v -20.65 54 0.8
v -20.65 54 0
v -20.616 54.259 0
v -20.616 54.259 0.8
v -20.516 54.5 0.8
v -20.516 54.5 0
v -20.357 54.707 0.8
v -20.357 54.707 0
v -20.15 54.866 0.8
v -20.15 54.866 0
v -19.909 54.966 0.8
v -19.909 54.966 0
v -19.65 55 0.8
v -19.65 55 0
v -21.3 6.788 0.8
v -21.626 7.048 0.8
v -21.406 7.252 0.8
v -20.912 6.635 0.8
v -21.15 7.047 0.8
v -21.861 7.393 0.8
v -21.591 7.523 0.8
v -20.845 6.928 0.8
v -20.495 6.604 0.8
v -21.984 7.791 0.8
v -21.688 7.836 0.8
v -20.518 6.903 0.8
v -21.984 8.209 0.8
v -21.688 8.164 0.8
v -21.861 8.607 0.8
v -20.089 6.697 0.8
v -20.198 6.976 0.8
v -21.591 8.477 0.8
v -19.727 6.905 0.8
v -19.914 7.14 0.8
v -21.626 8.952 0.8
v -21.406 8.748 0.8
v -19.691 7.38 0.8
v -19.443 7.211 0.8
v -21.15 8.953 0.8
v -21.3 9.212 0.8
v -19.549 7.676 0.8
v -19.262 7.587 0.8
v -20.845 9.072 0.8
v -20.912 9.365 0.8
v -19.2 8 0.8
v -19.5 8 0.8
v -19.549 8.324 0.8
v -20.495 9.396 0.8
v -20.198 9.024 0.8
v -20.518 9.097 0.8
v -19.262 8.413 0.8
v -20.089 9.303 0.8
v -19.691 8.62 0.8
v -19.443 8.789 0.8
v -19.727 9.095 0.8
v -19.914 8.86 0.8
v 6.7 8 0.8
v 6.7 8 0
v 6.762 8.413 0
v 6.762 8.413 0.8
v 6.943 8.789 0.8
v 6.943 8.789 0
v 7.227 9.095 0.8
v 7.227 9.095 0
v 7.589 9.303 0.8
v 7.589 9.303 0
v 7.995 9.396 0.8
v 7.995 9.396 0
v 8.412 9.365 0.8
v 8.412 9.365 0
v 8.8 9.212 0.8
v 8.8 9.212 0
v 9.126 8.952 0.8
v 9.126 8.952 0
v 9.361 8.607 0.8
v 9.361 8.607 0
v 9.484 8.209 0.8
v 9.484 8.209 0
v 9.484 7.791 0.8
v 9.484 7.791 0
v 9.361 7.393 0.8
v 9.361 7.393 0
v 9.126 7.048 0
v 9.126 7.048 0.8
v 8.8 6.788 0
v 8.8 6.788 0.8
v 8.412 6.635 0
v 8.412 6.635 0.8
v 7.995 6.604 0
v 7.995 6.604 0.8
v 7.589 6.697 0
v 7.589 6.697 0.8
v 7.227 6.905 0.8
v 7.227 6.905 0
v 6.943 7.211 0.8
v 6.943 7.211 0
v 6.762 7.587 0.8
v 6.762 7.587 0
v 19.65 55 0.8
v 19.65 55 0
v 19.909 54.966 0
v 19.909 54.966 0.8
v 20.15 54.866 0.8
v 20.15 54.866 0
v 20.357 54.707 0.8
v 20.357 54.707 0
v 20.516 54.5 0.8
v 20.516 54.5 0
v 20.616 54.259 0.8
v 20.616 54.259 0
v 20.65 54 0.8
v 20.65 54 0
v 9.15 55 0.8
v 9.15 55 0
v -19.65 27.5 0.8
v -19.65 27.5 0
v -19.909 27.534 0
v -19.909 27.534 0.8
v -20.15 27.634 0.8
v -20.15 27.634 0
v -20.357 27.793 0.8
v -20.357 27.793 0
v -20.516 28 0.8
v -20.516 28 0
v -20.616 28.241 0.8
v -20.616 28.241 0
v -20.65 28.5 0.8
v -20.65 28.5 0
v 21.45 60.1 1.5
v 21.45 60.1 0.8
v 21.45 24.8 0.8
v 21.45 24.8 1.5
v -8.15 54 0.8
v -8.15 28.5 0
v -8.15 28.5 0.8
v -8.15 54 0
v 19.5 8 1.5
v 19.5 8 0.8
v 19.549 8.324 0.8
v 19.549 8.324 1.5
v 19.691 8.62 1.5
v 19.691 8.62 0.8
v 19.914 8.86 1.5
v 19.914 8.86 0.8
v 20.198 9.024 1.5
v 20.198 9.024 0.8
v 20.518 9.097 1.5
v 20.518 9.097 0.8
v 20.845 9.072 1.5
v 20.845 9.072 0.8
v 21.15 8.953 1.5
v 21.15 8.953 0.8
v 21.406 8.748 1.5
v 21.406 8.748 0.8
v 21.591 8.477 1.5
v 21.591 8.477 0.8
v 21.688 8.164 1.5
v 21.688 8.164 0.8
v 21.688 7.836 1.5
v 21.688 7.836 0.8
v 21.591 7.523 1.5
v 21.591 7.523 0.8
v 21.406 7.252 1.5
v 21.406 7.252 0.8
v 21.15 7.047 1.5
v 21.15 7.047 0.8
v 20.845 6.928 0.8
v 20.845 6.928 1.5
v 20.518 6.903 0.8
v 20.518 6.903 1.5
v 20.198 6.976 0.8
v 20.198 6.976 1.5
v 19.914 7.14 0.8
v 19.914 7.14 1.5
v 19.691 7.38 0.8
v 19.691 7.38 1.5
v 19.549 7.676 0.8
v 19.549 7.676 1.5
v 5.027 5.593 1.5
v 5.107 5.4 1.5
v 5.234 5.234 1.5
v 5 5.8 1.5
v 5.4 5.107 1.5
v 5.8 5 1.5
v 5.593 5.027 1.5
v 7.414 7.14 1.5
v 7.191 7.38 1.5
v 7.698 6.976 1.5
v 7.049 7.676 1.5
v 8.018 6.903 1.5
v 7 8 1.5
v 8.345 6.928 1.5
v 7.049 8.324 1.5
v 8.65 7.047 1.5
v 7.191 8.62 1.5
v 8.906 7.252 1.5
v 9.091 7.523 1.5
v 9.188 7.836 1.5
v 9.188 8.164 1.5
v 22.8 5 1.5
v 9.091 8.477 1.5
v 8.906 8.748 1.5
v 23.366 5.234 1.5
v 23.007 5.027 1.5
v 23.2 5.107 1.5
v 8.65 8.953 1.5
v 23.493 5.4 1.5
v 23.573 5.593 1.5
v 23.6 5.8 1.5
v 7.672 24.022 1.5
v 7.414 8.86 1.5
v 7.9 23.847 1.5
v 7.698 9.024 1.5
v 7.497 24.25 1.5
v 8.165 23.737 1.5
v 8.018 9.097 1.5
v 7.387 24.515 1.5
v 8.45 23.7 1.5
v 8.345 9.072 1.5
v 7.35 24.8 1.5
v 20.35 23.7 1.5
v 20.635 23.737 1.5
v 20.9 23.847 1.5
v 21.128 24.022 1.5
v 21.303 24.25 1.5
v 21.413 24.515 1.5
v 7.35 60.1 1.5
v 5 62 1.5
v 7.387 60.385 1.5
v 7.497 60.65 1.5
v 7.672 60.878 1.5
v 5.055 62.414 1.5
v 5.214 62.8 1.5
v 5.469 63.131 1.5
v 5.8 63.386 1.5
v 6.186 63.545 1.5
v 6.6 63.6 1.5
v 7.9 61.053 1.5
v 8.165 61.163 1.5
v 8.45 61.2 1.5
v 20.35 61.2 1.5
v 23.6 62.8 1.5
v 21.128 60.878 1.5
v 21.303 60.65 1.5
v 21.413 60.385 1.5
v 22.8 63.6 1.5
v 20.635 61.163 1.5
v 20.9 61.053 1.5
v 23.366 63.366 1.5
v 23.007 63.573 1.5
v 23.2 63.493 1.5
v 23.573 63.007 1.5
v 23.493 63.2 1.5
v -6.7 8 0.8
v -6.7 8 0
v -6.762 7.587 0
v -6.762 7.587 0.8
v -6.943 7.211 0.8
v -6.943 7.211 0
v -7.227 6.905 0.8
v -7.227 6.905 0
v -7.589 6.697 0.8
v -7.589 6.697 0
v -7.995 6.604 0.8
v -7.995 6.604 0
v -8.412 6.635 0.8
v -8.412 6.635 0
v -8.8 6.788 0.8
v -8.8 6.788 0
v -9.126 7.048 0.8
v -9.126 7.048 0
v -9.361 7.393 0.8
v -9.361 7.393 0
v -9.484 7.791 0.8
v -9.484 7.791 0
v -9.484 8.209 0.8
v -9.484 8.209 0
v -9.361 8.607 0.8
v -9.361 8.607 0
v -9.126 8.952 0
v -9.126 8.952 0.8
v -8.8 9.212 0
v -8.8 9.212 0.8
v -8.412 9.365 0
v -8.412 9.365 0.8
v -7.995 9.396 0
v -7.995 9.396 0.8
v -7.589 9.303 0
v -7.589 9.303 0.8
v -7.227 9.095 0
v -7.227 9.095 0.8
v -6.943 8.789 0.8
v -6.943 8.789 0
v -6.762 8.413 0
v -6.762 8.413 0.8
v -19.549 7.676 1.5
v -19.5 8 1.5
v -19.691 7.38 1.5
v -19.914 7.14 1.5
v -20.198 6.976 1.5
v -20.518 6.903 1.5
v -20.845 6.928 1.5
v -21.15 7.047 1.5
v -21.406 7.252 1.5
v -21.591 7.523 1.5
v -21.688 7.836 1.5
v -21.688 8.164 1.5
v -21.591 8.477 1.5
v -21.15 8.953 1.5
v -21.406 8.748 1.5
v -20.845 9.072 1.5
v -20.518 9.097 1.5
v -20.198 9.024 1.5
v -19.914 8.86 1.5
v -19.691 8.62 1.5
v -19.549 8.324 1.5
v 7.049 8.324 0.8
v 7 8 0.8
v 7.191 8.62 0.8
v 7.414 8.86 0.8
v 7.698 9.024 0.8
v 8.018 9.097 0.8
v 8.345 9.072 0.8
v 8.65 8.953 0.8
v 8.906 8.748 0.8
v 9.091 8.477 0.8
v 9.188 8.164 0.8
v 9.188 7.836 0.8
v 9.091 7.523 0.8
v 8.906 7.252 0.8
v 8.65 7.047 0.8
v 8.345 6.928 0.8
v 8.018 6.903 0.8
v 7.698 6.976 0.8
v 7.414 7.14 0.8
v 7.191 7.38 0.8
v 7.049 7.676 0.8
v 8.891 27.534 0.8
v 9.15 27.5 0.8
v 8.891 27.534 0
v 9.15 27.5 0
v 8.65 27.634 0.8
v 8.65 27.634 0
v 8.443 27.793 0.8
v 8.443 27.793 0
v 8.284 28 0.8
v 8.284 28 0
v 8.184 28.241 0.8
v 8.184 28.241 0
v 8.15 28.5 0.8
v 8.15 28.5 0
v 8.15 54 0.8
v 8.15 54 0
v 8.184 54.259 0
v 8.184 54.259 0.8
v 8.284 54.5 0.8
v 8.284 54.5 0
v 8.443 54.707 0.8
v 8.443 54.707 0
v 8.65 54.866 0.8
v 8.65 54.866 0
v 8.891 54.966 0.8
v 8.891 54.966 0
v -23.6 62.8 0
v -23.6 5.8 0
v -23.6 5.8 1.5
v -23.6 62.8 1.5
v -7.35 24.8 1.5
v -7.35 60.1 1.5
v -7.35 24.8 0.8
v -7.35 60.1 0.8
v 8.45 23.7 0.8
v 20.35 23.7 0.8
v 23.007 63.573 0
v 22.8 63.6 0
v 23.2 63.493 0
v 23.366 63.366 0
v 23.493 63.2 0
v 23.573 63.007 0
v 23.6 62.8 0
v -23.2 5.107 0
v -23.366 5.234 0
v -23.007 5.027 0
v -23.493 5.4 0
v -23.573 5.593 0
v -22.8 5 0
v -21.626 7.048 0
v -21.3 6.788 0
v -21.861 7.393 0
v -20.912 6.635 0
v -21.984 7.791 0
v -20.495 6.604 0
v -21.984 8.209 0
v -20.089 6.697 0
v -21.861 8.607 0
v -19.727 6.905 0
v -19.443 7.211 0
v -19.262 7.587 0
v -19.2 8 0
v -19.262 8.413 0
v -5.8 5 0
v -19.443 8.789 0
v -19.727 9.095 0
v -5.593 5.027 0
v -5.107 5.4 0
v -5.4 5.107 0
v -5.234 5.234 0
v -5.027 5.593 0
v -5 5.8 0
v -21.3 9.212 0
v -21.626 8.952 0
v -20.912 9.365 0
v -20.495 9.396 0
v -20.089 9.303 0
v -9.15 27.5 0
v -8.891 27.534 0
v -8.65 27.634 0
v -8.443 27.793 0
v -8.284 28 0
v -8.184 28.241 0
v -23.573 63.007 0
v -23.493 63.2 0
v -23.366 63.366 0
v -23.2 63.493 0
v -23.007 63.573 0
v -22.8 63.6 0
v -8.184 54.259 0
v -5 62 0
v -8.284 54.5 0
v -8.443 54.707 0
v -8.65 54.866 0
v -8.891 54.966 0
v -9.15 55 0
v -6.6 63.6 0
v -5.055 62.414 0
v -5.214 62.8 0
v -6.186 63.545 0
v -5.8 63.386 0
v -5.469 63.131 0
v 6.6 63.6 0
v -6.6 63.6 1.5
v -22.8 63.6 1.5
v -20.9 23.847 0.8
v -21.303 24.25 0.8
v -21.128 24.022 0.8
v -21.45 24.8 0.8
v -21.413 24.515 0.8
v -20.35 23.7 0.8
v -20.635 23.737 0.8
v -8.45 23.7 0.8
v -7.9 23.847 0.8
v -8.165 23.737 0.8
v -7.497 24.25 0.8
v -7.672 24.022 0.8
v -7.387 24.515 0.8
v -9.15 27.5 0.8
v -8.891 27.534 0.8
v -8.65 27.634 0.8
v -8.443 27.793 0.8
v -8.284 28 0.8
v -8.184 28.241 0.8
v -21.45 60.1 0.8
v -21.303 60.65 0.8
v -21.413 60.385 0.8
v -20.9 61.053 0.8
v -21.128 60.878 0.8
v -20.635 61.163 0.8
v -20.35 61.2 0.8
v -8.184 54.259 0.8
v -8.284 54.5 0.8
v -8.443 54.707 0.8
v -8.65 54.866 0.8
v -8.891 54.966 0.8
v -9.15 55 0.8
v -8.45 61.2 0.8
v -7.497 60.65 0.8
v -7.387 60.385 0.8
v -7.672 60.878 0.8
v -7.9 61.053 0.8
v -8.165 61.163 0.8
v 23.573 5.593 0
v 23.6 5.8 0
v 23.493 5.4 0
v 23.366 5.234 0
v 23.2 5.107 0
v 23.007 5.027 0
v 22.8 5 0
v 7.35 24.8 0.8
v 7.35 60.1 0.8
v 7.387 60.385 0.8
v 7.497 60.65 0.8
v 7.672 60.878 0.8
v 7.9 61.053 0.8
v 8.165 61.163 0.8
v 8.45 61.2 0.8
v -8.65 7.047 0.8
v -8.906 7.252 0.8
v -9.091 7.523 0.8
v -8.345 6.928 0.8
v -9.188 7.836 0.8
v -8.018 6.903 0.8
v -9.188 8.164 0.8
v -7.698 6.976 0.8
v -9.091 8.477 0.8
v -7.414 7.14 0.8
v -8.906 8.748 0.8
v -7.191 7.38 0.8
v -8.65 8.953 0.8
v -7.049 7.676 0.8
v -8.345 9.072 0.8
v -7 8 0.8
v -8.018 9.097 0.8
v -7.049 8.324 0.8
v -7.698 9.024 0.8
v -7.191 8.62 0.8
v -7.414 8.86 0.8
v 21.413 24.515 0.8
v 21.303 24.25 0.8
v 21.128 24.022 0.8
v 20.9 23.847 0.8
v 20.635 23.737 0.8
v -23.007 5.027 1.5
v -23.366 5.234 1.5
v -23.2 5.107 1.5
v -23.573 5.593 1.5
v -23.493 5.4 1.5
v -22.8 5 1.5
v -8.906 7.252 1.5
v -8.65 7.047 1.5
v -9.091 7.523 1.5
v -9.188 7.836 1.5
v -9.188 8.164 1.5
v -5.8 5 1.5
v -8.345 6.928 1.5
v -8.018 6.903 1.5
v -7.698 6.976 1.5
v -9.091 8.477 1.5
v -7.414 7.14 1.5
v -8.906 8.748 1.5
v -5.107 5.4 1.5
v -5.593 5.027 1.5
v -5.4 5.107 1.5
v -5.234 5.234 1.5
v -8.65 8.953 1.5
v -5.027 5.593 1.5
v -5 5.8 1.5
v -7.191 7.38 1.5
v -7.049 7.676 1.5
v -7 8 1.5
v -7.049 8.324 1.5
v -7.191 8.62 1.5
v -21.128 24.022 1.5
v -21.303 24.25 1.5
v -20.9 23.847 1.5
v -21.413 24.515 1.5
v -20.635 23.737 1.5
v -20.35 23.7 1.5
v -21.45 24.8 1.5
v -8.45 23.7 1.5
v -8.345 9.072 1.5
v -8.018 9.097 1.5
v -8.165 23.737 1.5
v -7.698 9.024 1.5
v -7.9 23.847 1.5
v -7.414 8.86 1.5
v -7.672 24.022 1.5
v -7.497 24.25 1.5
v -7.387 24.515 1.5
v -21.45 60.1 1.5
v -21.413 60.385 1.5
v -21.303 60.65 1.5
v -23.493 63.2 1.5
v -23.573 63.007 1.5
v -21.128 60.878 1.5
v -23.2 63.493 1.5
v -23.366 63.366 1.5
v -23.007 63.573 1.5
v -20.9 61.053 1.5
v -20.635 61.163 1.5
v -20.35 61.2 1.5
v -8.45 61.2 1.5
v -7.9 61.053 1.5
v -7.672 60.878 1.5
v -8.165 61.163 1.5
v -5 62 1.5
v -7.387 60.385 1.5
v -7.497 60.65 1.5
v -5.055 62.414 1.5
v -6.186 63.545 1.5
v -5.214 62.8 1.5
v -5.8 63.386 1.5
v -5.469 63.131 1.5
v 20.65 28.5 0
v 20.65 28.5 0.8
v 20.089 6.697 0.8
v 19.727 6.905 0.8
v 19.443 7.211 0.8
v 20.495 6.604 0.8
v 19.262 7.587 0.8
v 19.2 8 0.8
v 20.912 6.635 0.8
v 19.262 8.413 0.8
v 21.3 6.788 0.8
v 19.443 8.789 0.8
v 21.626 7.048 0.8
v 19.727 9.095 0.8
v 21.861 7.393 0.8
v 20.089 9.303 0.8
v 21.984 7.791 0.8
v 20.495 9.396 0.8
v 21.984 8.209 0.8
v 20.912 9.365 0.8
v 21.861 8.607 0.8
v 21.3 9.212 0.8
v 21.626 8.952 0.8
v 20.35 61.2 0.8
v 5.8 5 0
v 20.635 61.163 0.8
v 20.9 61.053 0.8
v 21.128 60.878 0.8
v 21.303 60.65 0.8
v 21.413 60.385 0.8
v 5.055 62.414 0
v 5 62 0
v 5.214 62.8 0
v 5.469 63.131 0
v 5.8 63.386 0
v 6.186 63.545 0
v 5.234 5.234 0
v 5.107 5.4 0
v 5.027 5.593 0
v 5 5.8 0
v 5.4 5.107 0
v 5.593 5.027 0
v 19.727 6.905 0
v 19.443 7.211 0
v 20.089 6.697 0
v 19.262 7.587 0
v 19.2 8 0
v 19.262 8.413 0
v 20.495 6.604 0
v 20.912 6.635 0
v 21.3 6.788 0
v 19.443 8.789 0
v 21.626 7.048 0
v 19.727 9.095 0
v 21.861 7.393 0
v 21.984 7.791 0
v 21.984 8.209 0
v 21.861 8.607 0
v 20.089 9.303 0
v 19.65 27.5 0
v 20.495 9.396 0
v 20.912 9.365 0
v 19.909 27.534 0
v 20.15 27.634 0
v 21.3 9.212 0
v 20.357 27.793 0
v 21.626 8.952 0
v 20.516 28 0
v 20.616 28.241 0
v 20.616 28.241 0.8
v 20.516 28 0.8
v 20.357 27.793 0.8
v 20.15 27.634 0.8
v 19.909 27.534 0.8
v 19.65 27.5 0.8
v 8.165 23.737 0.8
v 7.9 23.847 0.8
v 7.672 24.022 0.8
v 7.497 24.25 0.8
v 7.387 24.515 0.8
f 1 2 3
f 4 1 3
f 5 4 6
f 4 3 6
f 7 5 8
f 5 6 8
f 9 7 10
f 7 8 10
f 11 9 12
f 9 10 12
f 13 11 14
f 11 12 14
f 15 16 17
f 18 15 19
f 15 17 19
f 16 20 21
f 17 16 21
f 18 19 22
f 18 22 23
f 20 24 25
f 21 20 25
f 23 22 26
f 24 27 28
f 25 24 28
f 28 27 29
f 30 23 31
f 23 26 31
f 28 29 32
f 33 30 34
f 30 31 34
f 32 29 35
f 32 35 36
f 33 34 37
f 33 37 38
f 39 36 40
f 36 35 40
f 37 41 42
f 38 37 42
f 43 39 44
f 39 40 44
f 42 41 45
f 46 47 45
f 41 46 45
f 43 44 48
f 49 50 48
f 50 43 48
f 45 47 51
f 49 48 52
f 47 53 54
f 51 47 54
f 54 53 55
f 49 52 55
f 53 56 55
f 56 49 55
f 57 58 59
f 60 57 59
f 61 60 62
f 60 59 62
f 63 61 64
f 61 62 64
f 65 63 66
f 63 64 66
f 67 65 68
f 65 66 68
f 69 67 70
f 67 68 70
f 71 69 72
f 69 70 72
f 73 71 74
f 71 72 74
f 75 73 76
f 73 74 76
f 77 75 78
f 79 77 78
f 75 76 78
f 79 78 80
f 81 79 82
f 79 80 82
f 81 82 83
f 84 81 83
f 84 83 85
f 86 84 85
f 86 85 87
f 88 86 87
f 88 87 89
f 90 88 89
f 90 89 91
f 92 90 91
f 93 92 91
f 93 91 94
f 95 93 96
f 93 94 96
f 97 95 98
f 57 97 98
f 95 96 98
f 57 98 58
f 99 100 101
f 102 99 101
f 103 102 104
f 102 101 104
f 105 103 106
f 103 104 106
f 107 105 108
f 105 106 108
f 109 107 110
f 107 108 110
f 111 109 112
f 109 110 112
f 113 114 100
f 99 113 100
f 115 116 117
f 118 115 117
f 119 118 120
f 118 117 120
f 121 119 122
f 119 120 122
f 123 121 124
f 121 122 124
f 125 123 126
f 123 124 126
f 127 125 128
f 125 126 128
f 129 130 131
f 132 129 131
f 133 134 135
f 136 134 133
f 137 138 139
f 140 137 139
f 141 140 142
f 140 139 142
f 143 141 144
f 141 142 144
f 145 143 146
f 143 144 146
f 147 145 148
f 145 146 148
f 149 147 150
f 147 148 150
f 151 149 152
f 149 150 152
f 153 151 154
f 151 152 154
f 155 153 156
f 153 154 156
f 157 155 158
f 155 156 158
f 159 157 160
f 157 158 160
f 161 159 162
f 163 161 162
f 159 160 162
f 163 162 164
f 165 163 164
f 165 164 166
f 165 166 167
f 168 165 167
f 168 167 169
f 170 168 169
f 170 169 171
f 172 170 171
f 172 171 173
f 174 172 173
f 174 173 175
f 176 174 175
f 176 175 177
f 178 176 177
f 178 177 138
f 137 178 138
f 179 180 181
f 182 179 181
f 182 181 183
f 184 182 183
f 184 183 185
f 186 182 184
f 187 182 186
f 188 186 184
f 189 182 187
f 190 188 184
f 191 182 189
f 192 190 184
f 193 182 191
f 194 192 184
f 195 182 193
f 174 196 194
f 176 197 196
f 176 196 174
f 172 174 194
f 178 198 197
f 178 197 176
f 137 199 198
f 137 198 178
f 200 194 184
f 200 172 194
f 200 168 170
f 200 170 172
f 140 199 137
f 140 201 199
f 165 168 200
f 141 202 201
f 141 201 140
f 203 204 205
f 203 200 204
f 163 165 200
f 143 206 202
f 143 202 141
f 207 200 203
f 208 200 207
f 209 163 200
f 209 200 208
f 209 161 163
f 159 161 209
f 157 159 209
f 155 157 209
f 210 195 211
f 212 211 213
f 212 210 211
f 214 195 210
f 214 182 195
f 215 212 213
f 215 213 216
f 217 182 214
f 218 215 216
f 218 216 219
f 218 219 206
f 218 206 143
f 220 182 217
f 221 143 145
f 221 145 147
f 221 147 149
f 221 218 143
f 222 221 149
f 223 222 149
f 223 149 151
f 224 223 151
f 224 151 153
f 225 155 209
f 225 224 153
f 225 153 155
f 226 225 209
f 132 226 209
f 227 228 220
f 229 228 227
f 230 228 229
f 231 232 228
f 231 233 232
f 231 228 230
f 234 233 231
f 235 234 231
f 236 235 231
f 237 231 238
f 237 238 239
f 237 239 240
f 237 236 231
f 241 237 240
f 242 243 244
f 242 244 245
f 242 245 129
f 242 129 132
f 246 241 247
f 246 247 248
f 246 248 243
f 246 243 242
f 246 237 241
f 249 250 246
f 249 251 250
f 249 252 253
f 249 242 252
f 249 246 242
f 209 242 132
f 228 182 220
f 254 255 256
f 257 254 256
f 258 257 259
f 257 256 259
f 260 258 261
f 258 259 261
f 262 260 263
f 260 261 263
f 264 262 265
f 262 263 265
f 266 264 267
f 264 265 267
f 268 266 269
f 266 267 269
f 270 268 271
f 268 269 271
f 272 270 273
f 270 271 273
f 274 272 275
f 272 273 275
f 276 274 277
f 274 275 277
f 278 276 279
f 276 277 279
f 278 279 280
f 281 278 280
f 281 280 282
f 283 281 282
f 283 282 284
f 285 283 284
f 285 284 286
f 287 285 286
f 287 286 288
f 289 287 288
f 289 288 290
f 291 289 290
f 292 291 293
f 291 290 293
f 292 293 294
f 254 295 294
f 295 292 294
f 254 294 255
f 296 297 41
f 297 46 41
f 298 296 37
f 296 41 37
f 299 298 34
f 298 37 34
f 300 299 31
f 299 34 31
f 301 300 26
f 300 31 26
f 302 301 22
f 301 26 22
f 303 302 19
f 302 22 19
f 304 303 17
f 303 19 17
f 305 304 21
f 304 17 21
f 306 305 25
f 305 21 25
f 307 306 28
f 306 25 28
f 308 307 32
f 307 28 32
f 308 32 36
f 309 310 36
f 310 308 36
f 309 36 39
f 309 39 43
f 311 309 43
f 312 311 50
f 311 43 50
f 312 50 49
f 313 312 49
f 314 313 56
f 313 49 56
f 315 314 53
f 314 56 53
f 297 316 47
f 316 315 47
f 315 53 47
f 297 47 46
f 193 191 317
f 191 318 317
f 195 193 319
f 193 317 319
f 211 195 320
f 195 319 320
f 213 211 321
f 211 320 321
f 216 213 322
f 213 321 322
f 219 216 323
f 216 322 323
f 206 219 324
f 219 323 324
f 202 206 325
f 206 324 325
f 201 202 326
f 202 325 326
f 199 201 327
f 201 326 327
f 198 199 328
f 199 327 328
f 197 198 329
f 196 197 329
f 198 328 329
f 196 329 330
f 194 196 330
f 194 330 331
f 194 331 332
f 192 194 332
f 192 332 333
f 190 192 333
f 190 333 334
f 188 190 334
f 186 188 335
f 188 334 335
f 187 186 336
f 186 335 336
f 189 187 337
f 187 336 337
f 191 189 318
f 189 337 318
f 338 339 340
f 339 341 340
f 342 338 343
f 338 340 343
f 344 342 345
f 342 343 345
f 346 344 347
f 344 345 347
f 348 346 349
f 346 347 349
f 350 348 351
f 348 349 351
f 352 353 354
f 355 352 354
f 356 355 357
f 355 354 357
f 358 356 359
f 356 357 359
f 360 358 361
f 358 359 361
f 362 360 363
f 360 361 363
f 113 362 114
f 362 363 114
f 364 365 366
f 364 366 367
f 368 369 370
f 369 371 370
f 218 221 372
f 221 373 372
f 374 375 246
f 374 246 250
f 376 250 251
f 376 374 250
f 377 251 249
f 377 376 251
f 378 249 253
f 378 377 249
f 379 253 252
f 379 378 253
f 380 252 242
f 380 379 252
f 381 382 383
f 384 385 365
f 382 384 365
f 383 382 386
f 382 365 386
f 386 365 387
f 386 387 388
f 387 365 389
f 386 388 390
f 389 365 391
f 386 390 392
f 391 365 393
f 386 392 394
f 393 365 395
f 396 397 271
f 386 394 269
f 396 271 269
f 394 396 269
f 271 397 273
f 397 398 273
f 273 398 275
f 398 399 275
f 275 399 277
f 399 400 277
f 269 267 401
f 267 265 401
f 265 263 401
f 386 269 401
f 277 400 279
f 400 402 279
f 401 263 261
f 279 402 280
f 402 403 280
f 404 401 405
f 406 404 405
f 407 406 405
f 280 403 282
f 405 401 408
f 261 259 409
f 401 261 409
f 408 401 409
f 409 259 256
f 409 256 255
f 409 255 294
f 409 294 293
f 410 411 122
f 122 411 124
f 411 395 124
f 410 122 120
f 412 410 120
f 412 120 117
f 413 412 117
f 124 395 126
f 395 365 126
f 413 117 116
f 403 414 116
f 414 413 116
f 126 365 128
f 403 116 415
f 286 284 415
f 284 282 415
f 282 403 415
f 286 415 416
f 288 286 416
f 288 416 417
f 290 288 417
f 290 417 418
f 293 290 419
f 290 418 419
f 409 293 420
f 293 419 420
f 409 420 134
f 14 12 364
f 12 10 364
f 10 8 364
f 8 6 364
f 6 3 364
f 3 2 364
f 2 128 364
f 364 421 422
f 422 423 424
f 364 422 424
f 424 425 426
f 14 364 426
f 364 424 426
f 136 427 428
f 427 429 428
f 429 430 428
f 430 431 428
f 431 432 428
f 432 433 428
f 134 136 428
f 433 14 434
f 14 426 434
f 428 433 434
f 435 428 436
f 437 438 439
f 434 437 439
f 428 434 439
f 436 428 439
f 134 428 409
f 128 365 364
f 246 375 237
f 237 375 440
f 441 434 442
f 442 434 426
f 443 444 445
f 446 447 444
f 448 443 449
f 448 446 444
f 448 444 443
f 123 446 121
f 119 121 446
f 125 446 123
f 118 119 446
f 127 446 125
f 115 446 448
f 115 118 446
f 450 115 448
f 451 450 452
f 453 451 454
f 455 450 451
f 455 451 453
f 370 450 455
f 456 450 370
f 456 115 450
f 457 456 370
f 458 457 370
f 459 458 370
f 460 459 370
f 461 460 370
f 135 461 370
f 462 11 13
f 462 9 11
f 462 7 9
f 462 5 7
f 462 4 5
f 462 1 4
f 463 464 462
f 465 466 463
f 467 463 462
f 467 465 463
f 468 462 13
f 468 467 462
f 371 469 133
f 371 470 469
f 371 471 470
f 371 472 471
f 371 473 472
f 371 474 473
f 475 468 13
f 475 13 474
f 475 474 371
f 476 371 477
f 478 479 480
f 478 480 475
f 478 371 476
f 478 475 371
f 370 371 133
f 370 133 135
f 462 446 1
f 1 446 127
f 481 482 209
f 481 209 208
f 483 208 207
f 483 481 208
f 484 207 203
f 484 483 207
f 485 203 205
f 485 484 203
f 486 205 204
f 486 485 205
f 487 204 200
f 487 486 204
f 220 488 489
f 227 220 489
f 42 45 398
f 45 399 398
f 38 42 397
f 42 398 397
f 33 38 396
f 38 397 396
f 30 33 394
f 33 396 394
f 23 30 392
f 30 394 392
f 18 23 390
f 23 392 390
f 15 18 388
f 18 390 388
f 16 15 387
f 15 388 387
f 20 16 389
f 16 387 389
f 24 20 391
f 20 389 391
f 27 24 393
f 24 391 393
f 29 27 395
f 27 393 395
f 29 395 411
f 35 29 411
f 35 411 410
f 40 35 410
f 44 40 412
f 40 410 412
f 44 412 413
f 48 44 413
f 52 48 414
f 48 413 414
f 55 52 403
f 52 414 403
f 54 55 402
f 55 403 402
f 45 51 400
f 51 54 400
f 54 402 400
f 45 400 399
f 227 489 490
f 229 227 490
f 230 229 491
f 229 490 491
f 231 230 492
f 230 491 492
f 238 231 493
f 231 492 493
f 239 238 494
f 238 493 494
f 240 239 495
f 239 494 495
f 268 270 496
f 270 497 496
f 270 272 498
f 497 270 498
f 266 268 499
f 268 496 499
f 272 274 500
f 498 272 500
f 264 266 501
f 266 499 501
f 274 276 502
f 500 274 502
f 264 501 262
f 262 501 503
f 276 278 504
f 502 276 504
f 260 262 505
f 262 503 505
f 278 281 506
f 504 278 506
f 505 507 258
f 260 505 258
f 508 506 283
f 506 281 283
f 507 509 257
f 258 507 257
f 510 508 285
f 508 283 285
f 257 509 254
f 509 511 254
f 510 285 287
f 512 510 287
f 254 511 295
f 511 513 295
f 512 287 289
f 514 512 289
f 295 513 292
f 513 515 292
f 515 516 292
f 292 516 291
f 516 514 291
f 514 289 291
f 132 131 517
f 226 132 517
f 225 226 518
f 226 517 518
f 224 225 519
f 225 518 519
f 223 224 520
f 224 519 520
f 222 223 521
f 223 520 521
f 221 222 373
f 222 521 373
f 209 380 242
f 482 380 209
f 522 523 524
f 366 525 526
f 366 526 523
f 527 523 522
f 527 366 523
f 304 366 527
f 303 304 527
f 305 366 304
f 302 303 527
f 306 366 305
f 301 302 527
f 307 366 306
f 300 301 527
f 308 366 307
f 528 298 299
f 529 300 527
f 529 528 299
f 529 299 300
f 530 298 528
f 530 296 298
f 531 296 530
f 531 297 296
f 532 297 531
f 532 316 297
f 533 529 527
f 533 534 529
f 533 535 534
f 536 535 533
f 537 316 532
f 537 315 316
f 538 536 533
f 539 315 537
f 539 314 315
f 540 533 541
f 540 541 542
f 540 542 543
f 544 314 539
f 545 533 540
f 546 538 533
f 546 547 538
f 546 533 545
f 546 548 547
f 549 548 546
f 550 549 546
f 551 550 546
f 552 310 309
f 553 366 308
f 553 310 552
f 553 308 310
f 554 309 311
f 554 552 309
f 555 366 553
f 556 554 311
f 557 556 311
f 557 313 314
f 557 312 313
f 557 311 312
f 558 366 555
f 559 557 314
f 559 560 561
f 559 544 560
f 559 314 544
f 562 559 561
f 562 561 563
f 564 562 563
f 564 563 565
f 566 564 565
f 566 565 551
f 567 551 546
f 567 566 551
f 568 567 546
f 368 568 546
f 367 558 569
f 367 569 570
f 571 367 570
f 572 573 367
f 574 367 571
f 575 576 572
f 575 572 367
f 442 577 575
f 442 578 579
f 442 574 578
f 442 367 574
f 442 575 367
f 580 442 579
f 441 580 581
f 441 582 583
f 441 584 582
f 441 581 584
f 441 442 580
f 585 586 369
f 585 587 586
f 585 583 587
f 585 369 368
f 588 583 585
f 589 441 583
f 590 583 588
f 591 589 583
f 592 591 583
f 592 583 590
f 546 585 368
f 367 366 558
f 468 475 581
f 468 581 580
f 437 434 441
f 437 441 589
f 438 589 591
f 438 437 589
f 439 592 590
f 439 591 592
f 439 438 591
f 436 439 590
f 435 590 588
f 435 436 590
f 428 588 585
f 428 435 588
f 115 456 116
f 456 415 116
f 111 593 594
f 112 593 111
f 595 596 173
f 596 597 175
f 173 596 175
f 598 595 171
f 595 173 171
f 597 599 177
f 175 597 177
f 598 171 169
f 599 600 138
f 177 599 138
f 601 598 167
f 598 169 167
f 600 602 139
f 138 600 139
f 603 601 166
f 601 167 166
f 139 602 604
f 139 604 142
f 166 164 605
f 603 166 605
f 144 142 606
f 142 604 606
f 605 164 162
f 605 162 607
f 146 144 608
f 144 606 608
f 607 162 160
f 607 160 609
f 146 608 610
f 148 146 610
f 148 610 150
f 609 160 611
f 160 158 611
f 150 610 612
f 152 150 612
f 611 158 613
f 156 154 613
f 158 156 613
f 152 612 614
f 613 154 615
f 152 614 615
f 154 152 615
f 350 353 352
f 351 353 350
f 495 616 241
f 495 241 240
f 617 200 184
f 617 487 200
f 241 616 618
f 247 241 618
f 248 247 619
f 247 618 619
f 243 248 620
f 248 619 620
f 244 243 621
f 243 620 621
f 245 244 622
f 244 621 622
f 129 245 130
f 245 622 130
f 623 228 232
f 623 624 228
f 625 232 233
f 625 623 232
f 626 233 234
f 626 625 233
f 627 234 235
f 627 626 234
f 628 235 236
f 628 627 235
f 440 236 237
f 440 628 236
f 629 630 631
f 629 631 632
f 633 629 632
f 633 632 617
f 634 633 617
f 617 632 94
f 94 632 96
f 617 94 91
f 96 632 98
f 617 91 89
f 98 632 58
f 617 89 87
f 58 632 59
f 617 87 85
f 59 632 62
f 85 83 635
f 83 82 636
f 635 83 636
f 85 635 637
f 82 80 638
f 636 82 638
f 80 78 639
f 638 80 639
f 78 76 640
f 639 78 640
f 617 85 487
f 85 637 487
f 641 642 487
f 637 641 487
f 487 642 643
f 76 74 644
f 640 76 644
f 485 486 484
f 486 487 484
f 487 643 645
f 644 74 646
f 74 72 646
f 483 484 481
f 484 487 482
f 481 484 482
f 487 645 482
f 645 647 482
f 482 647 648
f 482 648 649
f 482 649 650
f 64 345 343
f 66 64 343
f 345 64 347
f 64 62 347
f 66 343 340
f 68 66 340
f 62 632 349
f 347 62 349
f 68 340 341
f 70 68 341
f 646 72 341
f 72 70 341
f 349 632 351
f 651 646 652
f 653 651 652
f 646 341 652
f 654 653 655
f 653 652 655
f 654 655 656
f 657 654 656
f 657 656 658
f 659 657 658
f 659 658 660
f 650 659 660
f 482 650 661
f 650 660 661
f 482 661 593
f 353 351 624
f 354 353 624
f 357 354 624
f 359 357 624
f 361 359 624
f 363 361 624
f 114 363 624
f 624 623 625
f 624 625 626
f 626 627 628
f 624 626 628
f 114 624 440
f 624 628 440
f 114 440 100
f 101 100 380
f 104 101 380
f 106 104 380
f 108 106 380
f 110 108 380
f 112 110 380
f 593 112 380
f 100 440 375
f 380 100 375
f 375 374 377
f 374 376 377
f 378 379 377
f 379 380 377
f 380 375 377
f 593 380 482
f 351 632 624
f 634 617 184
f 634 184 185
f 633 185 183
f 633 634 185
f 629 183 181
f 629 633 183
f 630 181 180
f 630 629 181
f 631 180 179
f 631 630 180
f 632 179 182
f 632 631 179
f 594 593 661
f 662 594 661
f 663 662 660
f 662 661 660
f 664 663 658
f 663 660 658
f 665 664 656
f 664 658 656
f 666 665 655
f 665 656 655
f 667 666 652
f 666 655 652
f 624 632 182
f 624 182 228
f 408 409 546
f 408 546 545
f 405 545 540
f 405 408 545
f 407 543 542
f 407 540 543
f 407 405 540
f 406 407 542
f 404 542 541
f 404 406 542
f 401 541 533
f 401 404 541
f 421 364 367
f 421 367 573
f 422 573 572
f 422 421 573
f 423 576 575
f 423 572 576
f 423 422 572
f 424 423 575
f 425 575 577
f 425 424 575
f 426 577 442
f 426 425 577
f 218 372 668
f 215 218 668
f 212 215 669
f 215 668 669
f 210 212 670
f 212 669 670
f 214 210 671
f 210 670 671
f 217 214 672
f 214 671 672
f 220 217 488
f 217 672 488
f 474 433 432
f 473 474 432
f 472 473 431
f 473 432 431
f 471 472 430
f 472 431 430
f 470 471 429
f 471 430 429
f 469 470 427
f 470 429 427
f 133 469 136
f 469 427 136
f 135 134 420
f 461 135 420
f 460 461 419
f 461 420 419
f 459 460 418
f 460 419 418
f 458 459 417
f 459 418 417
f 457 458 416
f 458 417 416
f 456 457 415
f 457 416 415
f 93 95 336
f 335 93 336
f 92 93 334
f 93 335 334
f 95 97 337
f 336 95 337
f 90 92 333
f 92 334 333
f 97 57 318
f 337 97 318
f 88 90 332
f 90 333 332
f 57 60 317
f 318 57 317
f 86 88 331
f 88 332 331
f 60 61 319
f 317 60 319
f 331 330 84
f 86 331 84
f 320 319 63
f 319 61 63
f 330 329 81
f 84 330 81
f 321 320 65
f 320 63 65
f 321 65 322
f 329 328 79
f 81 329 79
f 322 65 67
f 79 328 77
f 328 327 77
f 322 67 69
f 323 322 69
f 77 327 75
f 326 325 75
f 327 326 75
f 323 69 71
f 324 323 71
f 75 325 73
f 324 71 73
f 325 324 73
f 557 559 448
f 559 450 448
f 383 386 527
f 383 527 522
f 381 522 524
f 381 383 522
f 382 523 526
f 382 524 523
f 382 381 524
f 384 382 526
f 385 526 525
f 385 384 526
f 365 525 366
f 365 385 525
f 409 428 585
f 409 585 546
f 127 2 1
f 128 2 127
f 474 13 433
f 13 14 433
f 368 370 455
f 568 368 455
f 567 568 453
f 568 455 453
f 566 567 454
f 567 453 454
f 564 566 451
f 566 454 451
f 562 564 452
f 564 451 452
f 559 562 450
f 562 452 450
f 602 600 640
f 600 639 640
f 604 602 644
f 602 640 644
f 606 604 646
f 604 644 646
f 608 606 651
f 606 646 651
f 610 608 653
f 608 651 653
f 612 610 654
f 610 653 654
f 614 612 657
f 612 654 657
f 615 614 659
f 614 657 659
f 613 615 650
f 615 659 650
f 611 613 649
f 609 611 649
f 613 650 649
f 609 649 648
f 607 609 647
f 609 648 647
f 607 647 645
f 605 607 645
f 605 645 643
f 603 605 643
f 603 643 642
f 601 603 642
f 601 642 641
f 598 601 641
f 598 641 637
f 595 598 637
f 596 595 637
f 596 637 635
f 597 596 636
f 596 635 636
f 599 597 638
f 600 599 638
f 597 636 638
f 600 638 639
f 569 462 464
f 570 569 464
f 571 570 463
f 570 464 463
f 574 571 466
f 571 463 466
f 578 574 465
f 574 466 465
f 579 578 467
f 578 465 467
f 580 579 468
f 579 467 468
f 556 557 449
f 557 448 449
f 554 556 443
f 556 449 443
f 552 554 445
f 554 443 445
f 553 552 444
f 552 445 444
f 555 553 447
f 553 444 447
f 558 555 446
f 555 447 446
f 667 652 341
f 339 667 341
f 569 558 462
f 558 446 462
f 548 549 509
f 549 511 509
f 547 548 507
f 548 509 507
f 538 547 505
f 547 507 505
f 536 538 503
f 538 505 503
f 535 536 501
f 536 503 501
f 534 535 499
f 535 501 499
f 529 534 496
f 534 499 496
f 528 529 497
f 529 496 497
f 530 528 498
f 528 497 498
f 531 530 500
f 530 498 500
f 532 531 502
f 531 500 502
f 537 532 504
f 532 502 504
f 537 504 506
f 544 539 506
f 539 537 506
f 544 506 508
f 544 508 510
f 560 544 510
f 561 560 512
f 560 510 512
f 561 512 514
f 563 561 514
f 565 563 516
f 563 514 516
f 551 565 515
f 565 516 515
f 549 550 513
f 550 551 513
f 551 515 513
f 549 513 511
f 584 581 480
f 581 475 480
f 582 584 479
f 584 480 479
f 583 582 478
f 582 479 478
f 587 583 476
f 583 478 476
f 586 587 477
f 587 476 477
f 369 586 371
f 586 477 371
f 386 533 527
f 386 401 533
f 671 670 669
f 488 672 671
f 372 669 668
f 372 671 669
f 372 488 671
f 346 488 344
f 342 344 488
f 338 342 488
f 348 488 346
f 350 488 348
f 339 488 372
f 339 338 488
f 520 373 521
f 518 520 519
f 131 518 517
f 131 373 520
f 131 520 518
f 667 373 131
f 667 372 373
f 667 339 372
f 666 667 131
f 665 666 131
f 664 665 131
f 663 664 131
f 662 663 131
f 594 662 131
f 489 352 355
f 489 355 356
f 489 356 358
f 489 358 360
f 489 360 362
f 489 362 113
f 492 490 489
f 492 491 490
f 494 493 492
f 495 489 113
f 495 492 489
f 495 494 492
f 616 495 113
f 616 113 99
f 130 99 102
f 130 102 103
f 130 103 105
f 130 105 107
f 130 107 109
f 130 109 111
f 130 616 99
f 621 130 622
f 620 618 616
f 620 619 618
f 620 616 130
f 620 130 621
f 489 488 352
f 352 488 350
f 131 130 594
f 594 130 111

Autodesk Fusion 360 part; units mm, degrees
sketch "mriya-display-cover" plane through (0, 0, 0) normal (0, 0, 1) x (1, 0, 0)
  circle A0 centre (-20.6, 8) radius 1.1
  circle A1 centre (-8.1, 8) radius 1.1
  circle A2 centre (-20.6, 8) radius 1.4
  circle A3 centre (-8.1, 8) radius 1.4
  line L0 (-21.45, 24.8) -> (-21.45, 60.1)
  line L1 (-8.45, 23.7) -> (-20.35, 23.7)
  line L2 (-9.15, 27.5) -> (-19.65, 27.5)
  line L3 (-19.65, 55) -> (-9.15, 55)
  line L4 (-8.45, 61.2) -> (-20.35, 61.2)
  line L5 (-20.65, 54) -> (-20.65, 28.5)
  line L6 (-8.15, 28.5) -> (-8.15, 54)
  line L7 (-7.35, 60.1) -> (-7.35, 24.8)
  line L8 (-23.6, 5.8) -> (-23.6, 62.7) construction
  line L9 (-6.6, 63.6) -> (-22.8, 63.6)
  line L10 (-5, 62) -> (-5, 5.8)
  line L11 (-22.8, 5) -> (-5.9, 5) construction
  line L12 (-5.1, 62) -> (-5.1, 5.8) construction
  line L13 (-6.6, 63.5) -> (-22.8, 63.5) construction
  arc A4 (-5.1, 62) -> (-6.6, 63.5) centre (-6.6, 62) ccw construction
  arc A5 (-22.8, 63.5) -> (-23.6, 62.7) centre (-22.8, 62.7) ccw construction
  arc A6 (-23.6, 5.8) -> (-22.8, 5) centre (-22.8, 5.8) ccw construction
  arc A7 (-5.9, 5) -> (-5.1, 5.8) centre (-5.9, 5.8) ccw construction
  line L14 (-5.8, 5) -> (-22.8, 5)
  line L15 (-23.6, 5.8) -> (-23.6, 62.8)
  arc A8 (-22.8, 63.6) -> (-23.6, 62.8) centre (-22.8, 62.8) ccw
  arc A9 (-5, 62) -> (-6.6, 63.6) centre (-6.6, 62) ccw
  arc A10 (-5.8, 5) -> (-5, 5.8) centre (-5.8, 5.8) ccw
  arc A11 (-23.6, 5.8) -> (-22.8, 5) centre (-22.8, 5.8) ccw
  arc A12 (-19.65, 55) -> (-20.65, 54) centre (-19.65, 54) ccw
  arc A13 (-8.15, 54) -> (-9.15, 55) centre (-9.15, 54) ccw
  arc A14 (-20.65, 28.5) -> (-19.65, 27.5) centre (-19.65, 28.5) ccw
  arc A15 (-9.15, 27.5) -> (-8.15, 28.5) centre (-9.15, 28.5) ccw
  arc A16 (-21.45, 24.8) -> (-20.35, 23.7) centre (-20.35, 24.8) ccw
  arc A17 (-8.45, 23.7) -> (-7.35, 24.8) centre (-8.45, 24.8) ccw
  line L16 (-5.7, 26.1) -> (-5.7, 62) construction
  line L17 (-18.5, 62.9) -> (-6.6, 62.9) construction
  arc A18 (-19.1, 63.5) -> (-18.5, 62.9) centre (-18.5, 63.5) ccw construction
  arc A19 (-5.7, 26.1) -> (-5.1, 25.5) centre (-5.1, 26.1) ccw construction
  arc A20 (-5.7, 62) -> (-6.6, 62.9) centre (-6.6, 62) ccw construction
  circle A21 centre (-14.4, 14.5) radius 5 construction
  circle A22 centre (-20.6, 20.5) radius 1.7 construction
  circle A23 centre (-8.1, 20.5) radius 1.7 construction
  arc A24 (-20.35, 61.2) -> (-21.45, 60.1) centre (-20.35, 60.1) ccw
  arc A25 (-7.35, 60.1) -> (-8.45, 61.2) centre (-8.45, 60.1) ccw
  dimension "d8" = 2.2
  dimension "d9" = 2.2
  dimension "d17" = 2.8
  dimension "d18" = 2.8
  dimension "d585" = 10
  dimension "d588" = 3.4
  dimension "d589" = 3.4
extrude "Extrude75" add sketch "mriya-display-cover" along normal blind 1.5 contours L9 L10 L14 L15 A8 A9 A10 A11 makes body 1
extrude "Extrude76" add sketch "mriya-display-cover" along normal blind 0.8 contours L0 L1 L4 L7 A16 A17 A24 A25 bodies 1
extrude "Extrude77" add sketch "mriya-display-cover" along normal blind 0.7 from surface at 0.8 contours A2 | A3 bodies 1
mirror "Mirror9" about plane through (0, 0, 0) normal (1, 0, 0) of bodies 1 makes body 2
